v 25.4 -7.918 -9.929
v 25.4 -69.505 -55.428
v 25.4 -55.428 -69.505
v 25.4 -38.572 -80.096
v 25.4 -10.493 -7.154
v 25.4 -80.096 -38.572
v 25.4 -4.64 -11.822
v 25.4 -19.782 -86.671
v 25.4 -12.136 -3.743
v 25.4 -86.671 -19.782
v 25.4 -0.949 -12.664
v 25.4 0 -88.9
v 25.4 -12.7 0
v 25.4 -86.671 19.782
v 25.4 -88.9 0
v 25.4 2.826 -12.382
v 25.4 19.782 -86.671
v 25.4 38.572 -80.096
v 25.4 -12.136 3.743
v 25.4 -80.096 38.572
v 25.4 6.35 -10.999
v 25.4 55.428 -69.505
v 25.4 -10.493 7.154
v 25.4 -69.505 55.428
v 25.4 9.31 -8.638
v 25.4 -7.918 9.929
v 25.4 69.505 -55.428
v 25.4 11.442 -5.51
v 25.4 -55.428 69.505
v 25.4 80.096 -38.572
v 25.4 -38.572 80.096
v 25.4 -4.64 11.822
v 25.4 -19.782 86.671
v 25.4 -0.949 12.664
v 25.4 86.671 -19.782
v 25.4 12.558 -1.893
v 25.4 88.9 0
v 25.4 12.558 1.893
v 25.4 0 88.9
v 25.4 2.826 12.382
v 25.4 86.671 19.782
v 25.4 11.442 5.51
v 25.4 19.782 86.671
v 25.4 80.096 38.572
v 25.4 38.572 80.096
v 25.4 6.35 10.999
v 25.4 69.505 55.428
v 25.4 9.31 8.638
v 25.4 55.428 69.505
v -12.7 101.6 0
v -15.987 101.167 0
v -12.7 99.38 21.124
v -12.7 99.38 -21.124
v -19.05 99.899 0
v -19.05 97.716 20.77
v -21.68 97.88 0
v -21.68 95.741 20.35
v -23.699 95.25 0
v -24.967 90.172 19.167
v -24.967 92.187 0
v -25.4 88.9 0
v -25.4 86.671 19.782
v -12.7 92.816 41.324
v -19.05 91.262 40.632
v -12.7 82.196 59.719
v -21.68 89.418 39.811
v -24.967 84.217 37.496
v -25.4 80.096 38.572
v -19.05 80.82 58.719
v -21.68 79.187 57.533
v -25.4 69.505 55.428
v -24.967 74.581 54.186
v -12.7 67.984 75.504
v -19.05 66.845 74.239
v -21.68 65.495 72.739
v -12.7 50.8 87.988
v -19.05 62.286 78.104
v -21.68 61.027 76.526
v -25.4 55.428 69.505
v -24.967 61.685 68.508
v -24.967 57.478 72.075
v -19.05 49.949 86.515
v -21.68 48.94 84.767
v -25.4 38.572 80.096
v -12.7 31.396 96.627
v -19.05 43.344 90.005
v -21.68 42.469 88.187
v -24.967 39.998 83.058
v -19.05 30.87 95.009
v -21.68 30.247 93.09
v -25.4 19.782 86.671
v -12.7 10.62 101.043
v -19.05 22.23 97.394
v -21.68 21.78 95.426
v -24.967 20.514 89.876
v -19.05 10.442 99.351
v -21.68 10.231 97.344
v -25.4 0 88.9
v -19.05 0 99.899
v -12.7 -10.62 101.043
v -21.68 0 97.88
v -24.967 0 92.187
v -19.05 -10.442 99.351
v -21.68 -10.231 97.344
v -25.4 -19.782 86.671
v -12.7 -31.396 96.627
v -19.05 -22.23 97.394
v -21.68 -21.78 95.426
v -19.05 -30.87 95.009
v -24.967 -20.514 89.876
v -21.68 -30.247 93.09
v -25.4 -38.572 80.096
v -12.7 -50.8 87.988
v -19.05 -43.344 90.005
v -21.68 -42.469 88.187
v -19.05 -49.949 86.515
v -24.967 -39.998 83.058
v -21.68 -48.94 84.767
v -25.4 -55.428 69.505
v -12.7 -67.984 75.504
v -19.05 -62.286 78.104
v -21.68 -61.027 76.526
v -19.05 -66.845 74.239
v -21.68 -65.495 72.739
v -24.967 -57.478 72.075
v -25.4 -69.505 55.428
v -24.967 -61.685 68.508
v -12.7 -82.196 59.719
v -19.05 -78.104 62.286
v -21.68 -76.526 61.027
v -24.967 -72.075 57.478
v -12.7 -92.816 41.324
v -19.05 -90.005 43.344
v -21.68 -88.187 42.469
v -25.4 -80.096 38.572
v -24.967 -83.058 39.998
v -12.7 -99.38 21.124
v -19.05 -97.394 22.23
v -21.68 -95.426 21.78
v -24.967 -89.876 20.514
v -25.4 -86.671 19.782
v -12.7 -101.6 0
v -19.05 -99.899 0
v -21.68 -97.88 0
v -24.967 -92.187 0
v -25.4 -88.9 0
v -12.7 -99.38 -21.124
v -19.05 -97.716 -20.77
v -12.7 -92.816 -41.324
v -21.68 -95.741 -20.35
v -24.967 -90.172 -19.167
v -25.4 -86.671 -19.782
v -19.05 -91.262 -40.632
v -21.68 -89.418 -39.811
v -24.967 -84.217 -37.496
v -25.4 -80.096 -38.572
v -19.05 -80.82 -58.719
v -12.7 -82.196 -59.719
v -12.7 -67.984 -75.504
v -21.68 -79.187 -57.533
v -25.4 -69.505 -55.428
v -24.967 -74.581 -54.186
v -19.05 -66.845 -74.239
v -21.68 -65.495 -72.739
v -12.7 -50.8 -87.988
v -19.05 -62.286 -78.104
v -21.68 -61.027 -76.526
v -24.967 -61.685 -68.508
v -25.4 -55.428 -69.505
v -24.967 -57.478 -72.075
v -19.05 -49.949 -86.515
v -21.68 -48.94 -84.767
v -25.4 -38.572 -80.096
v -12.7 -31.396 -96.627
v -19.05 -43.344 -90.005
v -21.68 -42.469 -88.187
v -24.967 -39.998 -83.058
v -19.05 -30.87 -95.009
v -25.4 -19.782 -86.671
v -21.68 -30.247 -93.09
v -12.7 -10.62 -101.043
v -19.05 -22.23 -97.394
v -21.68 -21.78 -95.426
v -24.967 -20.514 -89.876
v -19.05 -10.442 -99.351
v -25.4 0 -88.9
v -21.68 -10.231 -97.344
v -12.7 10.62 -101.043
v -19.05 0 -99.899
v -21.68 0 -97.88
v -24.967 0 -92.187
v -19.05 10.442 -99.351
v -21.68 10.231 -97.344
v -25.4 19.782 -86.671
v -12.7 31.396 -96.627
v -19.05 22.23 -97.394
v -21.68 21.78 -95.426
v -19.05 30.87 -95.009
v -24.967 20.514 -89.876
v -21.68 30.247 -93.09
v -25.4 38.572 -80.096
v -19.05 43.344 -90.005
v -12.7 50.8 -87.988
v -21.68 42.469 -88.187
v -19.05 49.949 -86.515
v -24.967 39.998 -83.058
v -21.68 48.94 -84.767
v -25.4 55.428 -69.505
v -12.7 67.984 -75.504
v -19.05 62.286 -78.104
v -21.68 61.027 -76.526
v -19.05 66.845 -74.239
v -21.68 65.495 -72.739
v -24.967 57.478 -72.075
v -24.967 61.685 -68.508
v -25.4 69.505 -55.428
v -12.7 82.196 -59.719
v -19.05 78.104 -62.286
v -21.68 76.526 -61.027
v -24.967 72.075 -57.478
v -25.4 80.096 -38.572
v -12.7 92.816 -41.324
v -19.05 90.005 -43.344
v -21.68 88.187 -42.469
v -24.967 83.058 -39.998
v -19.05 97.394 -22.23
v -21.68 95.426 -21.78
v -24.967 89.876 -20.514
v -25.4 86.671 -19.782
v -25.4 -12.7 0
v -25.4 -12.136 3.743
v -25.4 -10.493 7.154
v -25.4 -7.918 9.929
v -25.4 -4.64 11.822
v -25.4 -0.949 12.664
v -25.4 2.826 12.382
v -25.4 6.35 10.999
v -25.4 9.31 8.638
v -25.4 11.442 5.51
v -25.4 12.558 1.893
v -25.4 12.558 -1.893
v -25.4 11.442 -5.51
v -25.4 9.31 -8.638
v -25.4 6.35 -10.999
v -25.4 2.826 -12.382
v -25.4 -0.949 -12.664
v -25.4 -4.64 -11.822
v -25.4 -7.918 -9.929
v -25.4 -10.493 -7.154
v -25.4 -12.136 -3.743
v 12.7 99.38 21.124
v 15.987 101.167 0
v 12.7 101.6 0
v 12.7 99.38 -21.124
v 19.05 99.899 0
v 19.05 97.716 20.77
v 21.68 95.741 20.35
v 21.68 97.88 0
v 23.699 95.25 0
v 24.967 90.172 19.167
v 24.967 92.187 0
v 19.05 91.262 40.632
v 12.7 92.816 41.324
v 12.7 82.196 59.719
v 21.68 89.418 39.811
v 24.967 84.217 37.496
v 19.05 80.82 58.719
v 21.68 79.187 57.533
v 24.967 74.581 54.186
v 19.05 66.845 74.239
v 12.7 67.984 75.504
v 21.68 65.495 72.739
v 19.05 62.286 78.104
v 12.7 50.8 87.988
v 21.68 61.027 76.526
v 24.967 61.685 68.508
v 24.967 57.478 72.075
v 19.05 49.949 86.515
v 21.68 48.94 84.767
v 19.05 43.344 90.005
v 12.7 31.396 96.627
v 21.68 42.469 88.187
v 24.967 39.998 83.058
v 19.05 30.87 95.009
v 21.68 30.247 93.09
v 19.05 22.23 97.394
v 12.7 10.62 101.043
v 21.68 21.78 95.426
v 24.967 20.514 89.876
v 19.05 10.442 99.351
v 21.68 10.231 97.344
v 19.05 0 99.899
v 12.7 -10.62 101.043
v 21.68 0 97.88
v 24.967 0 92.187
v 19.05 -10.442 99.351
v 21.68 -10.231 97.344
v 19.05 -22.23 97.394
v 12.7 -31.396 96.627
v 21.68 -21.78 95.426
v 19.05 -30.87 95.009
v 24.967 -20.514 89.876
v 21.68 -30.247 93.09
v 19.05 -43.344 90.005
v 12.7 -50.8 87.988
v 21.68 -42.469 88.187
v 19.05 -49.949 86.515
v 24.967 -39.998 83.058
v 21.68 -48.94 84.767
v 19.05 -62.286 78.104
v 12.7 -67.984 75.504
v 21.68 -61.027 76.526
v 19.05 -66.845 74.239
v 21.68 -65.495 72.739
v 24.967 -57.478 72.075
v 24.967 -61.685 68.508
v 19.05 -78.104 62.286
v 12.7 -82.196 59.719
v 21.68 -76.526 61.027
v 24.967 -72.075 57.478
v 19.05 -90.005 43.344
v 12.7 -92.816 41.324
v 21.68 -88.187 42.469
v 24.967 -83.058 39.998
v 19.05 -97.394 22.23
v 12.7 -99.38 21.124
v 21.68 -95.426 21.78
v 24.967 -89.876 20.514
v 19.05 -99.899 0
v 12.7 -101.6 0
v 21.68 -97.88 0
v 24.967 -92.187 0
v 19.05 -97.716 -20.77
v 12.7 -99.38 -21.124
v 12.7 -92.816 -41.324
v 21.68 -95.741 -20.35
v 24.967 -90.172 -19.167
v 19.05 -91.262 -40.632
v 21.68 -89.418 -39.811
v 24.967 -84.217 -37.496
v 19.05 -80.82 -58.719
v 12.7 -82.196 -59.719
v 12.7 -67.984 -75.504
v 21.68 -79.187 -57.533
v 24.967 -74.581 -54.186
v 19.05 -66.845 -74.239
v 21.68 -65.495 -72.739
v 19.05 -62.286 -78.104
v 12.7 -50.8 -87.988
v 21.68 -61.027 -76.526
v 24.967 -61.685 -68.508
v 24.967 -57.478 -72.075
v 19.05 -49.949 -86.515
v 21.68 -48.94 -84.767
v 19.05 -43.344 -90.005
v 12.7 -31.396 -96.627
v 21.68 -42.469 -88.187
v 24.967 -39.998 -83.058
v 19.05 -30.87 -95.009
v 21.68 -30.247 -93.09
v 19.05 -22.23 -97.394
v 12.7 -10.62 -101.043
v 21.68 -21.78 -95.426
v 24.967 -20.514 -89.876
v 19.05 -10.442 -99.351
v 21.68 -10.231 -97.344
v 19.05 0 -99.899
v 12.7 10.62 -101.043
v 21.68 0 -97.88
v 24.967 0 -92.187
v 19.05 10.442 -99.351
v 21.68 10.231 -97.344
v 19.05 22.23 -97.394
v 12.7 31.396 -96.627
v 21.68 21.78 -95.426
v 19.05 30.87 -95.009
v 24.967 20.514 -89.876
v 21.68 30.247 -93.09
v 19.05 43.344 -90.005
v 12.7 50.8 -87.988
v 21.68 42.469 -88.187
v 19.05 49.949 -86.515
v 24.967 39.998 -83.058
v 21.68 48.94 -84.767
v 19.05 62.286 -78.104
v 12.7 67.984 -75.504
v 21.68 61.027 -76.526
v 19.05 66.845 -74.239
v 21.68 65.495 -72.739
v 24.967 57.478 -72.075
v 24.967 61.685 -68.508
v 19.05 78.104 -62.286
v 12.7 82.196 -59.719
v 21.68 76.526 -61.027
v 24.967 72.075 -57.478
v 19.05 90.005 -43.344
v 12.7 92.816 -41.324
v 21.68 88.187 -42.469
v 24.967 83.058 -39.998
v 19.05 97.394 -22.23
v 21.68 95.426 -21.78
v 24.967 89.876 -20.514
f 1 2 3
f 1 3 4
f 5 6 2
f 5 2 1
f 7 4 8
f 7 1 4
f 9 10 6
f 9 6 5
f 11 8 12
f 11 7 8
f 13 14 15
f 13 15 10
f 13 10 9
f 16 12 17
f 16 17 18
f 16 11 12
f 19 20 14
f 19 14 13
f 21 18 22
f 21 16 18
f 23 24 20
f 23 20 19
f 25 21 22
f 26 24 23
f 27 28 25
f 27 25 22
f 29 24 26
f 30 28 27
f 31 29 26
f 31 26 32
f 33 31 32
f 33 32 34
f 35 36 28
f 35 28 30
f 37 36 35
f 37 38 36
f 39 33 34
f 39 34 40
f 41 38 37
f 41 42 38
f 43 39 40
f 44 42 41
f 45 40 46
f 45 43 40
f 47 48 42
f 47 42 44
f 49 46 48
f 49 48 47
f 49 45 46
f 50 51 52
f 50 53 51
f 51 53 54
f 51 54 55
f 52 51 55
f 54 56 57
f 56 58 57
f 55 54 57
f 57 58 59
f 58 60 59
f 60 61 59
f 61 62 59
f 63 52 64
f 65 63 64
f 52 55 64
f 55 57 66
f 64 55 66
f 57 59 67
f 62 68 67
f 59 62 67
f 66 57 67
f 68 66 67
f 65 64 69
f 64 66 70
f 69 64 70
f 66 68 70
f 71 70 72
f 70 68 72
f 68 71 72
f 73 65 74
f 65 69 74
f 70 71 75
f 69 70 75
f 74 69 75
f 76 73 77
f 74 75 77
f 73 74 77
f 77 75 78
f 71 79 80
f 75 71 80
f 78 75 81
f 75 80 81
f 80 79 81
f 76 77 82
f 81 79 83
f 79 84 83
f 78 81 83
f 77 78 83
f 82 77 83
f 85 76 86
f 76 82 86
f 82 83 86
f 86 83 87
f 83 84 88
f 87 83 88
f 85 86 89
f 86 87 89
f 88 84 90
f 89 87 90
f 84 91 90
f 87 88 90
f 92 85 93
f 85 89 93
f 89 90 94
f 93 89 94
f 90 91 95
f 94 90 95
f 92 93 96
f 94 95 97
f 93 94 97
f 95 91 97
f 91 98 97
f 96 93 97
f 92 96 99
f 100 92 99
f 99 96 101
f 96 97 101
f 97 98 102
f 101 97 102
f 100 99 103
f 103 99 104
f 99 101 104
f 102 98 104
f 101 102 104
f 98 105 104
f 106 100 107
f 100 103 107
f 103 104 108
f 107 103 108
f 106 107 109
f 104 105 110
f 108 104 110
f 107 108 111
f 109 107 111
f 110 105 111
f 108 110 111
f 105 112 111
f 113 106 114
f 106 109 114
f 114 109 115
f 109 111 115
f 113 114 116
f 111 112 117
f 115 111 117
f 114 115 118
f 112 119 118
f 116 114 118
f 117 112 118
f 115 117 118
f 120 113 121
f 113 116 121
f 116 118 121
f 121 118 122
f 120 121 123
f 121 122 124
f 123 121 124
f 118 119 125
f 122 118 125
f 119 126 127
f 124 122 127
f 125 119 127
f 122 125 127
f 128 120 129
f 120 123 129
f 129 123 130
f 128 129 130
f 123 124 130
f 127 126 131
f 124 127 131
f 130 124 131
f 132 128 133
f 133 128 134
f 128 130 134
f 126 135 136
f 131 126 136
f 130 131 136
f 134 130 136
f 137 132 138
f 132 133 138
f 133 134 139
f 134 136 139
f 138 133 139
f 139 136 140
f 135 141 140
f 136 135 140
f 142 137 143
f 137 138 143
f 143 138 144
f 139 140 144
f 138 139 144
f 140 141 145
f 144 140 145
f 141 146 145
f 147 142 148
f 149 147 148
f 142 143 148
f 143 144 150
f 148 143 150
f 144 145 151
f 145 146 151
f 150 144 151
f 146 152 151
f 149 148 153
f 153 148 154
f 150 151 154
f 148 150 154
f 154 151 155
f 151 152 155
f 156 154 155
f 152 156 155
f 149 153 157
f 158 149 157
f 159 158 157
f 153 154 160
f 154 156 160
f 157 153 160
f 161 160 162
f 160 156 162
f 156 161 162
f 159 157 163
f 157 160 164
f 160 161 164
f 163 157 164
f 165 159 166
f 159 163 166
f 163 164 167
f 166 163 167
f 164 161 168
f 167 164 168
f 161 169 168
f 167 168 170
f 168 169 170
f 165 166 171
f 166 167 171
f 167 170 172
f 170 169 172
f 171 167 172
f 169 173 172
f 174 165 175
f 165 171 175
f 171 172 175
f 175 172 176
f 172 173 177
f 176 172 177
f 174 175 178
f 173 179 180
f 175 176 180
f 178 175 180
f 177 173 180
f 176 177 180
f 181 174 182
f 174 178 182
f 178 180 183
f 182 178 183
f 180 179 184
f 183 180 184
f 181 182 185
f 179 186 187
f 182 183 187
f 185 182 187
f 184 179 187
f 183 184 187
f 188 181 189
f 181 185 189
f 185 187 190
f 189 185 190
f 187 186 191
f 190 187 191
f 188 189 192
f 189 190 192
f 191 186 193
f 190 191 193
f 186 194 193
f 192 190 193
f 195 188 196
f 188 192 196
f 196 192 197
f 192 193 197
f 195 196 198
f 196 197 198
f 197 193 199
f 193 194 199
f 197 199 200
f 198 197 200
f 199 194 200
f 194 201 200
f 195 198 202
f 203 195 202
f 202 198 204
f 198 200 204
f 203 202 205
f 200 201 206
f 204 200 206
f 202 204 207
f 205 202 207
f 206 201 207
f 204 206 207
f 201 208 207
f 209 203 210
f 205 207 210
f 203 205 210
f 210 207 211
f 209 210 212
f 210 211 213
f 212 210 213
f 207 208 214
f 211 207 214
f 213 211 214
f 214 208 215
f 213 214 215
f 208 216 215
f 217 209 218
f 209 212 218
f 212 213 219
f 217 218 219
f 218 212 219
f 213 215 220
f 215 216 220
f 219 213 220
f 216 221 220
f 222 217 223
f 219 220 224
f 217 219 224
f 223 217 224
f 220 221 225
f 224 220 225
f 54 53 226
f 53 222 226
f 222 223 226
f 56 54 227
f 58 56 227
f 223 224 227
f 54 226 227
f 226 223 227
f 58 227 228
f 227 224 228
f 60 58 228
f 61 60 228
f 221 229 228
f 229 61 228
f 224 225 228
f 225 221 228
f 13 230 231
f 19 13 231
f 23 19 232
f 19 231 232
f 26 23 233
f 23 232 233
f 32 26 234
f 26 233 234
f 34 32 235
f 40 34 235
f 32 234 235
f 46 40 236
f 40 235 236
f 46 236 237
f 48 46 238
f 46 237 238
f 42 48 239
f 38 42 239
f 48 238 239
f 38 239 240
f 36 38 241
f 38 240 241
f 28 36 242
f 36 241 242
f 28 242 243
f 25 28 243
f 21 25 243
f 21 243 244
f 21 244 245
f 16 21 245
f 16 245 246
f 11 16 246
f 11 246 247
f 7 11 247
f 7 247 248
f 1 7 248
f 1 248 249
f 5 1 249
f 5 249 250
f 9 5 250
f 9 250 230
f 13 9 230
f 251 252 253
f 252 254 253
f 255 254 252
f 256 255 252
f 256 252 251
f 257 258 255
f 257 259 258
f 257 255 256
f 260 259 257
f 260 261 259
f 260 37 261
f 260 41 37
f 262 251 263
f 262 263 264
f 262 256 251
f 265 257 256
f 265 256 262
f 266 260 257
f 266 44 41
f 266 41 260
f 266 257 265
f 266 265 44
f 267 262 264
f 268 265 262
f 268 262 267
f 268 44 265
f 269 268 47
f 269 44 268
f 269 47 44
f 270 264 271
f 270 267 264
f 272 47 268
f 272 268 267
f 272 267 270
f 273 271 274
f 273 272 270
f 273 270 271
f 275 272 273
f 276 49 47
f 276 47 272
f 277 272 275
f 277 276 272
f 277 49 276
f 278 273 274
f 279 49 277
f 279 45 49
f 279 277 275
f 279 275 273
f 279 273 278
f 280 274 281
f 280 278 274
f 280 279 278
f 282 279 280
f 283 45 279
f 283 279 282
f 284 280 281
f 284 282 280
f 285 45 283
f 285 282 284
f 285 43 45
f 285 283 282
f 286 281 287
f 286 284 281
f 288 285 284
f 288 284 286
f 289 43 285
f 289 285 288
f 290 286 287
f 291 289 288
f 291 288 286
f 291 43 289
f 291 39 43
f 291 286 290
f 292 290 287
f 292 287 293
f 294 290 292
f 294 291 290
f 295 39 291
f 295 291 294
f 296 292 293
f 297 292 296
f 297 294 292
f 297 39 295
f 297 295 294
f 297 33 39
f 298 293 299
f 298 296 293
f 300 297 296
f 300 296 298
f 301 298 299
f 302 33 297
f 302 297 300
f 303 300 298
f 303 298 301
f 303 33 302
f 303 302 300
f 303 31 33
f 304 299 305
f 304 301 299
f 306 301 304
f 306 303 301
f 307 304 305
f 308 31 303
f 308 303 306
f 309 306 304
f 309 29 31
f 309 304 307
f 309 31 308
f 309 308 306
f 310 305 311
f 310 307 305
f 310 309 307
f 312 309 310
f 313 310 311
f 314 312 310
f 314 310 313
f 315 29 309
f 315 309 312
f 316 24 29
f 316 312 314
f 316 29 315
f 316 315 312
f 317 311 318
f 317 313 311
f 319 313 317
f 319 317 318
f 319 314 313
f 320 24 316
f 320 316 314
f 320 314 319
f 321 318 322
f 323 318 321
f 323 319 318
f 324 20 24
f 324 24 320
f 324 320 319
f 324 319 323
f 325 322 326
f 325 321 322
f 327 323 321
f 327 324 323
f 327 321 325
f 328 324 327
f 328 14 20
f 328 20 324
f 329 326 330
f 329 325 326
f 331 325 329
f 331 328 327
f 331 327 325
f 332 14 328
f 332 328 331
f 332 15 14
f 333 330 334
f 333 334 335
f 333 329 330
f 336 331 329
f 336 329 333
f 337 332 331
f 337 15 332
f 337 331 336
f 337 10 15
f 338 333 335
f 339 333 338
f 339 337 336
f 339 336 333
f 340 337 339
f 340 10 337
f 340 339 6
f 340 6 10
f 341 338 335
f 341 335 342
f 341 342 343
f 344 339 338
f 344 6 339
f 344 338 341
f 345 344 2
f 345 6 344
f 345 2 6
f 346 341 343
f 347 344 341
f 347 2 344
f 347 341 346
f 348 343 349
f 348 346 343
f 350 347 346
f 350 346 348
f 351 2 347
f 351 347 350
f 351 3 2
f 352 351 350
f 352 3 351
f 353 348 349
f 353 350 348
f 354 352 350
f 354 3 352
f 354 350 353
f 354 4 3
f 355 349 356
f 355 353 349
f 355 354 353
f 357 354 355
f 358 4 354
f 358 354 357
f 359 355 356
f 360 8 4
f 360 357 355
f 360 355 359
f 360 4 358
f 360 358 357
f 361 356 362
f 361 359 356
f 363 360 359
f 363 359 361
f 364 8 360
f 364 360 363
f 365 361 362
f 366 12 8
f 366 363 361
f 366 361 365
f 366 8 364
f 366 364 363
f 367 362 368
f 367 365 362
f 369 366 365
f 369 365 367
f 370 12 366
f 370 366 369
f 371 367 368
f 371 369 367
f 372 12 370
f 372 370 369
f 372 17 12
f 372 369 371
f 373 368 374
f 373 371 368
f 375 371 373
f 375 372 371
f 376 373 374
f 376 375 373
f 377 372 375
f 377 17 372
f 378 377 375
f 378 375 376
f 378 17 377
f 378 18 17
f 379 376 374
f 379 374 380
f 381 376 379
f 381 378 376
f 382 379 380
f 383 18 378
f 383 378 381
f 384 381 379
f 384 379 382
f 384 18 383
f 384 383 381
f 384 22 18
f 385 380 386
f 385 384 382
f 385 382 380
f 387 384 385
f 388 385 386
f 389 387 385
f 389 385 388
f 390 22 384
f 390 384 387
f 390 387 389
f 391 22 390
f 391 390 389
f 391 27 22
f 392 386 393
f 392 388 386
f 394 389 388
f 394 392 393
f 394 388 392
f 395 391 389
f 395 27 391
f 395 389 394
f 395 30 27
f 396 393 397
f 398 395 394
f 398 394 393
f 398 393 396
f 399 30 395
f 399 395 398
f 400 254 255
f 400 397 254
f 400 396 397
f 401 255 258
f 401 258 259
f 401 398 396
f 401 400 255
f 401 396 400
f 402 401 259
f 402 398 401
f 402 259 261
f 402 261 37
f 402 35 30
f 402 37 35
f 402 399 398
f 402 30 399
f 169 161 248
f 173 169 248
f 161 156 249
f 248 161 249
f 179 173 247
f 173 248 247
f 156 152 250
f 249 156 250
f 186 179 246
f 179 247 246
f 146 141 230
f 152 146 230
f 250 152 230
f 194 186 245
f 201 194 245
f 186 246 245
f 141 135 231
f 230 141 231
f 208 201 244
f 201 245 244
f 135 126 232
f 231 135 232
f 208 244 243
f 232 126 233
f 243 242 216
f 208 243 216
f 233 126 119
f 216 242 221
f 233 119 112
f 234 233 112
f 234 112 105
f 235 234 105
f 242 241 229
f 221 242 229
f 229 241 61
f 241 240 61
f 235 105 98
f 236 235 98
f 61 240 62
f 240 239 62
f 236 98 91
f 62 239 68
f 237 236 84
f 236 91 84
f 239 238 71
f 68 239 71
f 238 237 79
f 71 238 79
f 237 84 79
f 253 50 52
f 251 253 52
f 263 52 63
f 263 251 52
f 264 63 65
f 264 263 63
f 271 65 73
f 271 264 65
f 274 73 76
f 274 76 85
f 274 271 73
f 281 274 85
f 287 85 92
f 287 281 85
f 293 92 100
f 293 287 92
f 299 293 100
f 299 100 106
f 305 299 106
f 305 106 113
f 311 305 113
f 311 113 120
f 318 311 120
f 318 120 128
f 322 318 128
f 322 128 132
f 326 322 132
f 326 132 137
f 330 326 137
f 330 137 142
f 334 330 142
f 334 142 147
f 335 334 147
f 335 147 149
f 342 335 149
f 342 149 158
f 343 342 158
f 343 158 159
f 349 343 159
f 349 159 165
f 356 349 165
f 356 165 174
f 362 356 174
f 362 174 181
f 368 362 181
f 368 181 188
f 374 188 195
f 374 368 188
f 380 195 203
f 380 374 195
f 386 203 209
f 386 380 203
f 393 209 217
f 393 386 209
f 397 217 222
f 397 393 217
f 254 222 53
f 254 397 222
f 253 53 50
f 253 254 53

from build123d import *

# Parameters (mm, degrees)
F0_R     = 101.6
F1_DEPTH = 25.4
F2_R     = 12.7
F3_R     = 12.7
F4_DEPTH = 50.801


with BuildPart() as f1:
    # F0 (on Right) → F1 (new body, symmetric)
    with BuildSketch(Plane.YZ):
        Circle(F0_R)
    extrude(amount=F1_DEPTH, both=True)

    # F2
    f2_edges = [f1.edges().sort_by_distance(p)[0] for p in [
        (-25.4, -101.6, 0),
        (25.4, -101.6, 0),
    ]]
    fillet(f2_edges, radius=F2_R)

    # F3 (on face) → F4 (cut, through all)
    with BuildSketch(Plane(origin=(-25.4, 0, 0), x_dir=(0, -1, 0), z_dir=(-1, 0, 0))):
        Circle(F3_R)
    extrude(amount=-F4_DEPTH, mode=Mode.SUBTRACT)


solid = f1.part
